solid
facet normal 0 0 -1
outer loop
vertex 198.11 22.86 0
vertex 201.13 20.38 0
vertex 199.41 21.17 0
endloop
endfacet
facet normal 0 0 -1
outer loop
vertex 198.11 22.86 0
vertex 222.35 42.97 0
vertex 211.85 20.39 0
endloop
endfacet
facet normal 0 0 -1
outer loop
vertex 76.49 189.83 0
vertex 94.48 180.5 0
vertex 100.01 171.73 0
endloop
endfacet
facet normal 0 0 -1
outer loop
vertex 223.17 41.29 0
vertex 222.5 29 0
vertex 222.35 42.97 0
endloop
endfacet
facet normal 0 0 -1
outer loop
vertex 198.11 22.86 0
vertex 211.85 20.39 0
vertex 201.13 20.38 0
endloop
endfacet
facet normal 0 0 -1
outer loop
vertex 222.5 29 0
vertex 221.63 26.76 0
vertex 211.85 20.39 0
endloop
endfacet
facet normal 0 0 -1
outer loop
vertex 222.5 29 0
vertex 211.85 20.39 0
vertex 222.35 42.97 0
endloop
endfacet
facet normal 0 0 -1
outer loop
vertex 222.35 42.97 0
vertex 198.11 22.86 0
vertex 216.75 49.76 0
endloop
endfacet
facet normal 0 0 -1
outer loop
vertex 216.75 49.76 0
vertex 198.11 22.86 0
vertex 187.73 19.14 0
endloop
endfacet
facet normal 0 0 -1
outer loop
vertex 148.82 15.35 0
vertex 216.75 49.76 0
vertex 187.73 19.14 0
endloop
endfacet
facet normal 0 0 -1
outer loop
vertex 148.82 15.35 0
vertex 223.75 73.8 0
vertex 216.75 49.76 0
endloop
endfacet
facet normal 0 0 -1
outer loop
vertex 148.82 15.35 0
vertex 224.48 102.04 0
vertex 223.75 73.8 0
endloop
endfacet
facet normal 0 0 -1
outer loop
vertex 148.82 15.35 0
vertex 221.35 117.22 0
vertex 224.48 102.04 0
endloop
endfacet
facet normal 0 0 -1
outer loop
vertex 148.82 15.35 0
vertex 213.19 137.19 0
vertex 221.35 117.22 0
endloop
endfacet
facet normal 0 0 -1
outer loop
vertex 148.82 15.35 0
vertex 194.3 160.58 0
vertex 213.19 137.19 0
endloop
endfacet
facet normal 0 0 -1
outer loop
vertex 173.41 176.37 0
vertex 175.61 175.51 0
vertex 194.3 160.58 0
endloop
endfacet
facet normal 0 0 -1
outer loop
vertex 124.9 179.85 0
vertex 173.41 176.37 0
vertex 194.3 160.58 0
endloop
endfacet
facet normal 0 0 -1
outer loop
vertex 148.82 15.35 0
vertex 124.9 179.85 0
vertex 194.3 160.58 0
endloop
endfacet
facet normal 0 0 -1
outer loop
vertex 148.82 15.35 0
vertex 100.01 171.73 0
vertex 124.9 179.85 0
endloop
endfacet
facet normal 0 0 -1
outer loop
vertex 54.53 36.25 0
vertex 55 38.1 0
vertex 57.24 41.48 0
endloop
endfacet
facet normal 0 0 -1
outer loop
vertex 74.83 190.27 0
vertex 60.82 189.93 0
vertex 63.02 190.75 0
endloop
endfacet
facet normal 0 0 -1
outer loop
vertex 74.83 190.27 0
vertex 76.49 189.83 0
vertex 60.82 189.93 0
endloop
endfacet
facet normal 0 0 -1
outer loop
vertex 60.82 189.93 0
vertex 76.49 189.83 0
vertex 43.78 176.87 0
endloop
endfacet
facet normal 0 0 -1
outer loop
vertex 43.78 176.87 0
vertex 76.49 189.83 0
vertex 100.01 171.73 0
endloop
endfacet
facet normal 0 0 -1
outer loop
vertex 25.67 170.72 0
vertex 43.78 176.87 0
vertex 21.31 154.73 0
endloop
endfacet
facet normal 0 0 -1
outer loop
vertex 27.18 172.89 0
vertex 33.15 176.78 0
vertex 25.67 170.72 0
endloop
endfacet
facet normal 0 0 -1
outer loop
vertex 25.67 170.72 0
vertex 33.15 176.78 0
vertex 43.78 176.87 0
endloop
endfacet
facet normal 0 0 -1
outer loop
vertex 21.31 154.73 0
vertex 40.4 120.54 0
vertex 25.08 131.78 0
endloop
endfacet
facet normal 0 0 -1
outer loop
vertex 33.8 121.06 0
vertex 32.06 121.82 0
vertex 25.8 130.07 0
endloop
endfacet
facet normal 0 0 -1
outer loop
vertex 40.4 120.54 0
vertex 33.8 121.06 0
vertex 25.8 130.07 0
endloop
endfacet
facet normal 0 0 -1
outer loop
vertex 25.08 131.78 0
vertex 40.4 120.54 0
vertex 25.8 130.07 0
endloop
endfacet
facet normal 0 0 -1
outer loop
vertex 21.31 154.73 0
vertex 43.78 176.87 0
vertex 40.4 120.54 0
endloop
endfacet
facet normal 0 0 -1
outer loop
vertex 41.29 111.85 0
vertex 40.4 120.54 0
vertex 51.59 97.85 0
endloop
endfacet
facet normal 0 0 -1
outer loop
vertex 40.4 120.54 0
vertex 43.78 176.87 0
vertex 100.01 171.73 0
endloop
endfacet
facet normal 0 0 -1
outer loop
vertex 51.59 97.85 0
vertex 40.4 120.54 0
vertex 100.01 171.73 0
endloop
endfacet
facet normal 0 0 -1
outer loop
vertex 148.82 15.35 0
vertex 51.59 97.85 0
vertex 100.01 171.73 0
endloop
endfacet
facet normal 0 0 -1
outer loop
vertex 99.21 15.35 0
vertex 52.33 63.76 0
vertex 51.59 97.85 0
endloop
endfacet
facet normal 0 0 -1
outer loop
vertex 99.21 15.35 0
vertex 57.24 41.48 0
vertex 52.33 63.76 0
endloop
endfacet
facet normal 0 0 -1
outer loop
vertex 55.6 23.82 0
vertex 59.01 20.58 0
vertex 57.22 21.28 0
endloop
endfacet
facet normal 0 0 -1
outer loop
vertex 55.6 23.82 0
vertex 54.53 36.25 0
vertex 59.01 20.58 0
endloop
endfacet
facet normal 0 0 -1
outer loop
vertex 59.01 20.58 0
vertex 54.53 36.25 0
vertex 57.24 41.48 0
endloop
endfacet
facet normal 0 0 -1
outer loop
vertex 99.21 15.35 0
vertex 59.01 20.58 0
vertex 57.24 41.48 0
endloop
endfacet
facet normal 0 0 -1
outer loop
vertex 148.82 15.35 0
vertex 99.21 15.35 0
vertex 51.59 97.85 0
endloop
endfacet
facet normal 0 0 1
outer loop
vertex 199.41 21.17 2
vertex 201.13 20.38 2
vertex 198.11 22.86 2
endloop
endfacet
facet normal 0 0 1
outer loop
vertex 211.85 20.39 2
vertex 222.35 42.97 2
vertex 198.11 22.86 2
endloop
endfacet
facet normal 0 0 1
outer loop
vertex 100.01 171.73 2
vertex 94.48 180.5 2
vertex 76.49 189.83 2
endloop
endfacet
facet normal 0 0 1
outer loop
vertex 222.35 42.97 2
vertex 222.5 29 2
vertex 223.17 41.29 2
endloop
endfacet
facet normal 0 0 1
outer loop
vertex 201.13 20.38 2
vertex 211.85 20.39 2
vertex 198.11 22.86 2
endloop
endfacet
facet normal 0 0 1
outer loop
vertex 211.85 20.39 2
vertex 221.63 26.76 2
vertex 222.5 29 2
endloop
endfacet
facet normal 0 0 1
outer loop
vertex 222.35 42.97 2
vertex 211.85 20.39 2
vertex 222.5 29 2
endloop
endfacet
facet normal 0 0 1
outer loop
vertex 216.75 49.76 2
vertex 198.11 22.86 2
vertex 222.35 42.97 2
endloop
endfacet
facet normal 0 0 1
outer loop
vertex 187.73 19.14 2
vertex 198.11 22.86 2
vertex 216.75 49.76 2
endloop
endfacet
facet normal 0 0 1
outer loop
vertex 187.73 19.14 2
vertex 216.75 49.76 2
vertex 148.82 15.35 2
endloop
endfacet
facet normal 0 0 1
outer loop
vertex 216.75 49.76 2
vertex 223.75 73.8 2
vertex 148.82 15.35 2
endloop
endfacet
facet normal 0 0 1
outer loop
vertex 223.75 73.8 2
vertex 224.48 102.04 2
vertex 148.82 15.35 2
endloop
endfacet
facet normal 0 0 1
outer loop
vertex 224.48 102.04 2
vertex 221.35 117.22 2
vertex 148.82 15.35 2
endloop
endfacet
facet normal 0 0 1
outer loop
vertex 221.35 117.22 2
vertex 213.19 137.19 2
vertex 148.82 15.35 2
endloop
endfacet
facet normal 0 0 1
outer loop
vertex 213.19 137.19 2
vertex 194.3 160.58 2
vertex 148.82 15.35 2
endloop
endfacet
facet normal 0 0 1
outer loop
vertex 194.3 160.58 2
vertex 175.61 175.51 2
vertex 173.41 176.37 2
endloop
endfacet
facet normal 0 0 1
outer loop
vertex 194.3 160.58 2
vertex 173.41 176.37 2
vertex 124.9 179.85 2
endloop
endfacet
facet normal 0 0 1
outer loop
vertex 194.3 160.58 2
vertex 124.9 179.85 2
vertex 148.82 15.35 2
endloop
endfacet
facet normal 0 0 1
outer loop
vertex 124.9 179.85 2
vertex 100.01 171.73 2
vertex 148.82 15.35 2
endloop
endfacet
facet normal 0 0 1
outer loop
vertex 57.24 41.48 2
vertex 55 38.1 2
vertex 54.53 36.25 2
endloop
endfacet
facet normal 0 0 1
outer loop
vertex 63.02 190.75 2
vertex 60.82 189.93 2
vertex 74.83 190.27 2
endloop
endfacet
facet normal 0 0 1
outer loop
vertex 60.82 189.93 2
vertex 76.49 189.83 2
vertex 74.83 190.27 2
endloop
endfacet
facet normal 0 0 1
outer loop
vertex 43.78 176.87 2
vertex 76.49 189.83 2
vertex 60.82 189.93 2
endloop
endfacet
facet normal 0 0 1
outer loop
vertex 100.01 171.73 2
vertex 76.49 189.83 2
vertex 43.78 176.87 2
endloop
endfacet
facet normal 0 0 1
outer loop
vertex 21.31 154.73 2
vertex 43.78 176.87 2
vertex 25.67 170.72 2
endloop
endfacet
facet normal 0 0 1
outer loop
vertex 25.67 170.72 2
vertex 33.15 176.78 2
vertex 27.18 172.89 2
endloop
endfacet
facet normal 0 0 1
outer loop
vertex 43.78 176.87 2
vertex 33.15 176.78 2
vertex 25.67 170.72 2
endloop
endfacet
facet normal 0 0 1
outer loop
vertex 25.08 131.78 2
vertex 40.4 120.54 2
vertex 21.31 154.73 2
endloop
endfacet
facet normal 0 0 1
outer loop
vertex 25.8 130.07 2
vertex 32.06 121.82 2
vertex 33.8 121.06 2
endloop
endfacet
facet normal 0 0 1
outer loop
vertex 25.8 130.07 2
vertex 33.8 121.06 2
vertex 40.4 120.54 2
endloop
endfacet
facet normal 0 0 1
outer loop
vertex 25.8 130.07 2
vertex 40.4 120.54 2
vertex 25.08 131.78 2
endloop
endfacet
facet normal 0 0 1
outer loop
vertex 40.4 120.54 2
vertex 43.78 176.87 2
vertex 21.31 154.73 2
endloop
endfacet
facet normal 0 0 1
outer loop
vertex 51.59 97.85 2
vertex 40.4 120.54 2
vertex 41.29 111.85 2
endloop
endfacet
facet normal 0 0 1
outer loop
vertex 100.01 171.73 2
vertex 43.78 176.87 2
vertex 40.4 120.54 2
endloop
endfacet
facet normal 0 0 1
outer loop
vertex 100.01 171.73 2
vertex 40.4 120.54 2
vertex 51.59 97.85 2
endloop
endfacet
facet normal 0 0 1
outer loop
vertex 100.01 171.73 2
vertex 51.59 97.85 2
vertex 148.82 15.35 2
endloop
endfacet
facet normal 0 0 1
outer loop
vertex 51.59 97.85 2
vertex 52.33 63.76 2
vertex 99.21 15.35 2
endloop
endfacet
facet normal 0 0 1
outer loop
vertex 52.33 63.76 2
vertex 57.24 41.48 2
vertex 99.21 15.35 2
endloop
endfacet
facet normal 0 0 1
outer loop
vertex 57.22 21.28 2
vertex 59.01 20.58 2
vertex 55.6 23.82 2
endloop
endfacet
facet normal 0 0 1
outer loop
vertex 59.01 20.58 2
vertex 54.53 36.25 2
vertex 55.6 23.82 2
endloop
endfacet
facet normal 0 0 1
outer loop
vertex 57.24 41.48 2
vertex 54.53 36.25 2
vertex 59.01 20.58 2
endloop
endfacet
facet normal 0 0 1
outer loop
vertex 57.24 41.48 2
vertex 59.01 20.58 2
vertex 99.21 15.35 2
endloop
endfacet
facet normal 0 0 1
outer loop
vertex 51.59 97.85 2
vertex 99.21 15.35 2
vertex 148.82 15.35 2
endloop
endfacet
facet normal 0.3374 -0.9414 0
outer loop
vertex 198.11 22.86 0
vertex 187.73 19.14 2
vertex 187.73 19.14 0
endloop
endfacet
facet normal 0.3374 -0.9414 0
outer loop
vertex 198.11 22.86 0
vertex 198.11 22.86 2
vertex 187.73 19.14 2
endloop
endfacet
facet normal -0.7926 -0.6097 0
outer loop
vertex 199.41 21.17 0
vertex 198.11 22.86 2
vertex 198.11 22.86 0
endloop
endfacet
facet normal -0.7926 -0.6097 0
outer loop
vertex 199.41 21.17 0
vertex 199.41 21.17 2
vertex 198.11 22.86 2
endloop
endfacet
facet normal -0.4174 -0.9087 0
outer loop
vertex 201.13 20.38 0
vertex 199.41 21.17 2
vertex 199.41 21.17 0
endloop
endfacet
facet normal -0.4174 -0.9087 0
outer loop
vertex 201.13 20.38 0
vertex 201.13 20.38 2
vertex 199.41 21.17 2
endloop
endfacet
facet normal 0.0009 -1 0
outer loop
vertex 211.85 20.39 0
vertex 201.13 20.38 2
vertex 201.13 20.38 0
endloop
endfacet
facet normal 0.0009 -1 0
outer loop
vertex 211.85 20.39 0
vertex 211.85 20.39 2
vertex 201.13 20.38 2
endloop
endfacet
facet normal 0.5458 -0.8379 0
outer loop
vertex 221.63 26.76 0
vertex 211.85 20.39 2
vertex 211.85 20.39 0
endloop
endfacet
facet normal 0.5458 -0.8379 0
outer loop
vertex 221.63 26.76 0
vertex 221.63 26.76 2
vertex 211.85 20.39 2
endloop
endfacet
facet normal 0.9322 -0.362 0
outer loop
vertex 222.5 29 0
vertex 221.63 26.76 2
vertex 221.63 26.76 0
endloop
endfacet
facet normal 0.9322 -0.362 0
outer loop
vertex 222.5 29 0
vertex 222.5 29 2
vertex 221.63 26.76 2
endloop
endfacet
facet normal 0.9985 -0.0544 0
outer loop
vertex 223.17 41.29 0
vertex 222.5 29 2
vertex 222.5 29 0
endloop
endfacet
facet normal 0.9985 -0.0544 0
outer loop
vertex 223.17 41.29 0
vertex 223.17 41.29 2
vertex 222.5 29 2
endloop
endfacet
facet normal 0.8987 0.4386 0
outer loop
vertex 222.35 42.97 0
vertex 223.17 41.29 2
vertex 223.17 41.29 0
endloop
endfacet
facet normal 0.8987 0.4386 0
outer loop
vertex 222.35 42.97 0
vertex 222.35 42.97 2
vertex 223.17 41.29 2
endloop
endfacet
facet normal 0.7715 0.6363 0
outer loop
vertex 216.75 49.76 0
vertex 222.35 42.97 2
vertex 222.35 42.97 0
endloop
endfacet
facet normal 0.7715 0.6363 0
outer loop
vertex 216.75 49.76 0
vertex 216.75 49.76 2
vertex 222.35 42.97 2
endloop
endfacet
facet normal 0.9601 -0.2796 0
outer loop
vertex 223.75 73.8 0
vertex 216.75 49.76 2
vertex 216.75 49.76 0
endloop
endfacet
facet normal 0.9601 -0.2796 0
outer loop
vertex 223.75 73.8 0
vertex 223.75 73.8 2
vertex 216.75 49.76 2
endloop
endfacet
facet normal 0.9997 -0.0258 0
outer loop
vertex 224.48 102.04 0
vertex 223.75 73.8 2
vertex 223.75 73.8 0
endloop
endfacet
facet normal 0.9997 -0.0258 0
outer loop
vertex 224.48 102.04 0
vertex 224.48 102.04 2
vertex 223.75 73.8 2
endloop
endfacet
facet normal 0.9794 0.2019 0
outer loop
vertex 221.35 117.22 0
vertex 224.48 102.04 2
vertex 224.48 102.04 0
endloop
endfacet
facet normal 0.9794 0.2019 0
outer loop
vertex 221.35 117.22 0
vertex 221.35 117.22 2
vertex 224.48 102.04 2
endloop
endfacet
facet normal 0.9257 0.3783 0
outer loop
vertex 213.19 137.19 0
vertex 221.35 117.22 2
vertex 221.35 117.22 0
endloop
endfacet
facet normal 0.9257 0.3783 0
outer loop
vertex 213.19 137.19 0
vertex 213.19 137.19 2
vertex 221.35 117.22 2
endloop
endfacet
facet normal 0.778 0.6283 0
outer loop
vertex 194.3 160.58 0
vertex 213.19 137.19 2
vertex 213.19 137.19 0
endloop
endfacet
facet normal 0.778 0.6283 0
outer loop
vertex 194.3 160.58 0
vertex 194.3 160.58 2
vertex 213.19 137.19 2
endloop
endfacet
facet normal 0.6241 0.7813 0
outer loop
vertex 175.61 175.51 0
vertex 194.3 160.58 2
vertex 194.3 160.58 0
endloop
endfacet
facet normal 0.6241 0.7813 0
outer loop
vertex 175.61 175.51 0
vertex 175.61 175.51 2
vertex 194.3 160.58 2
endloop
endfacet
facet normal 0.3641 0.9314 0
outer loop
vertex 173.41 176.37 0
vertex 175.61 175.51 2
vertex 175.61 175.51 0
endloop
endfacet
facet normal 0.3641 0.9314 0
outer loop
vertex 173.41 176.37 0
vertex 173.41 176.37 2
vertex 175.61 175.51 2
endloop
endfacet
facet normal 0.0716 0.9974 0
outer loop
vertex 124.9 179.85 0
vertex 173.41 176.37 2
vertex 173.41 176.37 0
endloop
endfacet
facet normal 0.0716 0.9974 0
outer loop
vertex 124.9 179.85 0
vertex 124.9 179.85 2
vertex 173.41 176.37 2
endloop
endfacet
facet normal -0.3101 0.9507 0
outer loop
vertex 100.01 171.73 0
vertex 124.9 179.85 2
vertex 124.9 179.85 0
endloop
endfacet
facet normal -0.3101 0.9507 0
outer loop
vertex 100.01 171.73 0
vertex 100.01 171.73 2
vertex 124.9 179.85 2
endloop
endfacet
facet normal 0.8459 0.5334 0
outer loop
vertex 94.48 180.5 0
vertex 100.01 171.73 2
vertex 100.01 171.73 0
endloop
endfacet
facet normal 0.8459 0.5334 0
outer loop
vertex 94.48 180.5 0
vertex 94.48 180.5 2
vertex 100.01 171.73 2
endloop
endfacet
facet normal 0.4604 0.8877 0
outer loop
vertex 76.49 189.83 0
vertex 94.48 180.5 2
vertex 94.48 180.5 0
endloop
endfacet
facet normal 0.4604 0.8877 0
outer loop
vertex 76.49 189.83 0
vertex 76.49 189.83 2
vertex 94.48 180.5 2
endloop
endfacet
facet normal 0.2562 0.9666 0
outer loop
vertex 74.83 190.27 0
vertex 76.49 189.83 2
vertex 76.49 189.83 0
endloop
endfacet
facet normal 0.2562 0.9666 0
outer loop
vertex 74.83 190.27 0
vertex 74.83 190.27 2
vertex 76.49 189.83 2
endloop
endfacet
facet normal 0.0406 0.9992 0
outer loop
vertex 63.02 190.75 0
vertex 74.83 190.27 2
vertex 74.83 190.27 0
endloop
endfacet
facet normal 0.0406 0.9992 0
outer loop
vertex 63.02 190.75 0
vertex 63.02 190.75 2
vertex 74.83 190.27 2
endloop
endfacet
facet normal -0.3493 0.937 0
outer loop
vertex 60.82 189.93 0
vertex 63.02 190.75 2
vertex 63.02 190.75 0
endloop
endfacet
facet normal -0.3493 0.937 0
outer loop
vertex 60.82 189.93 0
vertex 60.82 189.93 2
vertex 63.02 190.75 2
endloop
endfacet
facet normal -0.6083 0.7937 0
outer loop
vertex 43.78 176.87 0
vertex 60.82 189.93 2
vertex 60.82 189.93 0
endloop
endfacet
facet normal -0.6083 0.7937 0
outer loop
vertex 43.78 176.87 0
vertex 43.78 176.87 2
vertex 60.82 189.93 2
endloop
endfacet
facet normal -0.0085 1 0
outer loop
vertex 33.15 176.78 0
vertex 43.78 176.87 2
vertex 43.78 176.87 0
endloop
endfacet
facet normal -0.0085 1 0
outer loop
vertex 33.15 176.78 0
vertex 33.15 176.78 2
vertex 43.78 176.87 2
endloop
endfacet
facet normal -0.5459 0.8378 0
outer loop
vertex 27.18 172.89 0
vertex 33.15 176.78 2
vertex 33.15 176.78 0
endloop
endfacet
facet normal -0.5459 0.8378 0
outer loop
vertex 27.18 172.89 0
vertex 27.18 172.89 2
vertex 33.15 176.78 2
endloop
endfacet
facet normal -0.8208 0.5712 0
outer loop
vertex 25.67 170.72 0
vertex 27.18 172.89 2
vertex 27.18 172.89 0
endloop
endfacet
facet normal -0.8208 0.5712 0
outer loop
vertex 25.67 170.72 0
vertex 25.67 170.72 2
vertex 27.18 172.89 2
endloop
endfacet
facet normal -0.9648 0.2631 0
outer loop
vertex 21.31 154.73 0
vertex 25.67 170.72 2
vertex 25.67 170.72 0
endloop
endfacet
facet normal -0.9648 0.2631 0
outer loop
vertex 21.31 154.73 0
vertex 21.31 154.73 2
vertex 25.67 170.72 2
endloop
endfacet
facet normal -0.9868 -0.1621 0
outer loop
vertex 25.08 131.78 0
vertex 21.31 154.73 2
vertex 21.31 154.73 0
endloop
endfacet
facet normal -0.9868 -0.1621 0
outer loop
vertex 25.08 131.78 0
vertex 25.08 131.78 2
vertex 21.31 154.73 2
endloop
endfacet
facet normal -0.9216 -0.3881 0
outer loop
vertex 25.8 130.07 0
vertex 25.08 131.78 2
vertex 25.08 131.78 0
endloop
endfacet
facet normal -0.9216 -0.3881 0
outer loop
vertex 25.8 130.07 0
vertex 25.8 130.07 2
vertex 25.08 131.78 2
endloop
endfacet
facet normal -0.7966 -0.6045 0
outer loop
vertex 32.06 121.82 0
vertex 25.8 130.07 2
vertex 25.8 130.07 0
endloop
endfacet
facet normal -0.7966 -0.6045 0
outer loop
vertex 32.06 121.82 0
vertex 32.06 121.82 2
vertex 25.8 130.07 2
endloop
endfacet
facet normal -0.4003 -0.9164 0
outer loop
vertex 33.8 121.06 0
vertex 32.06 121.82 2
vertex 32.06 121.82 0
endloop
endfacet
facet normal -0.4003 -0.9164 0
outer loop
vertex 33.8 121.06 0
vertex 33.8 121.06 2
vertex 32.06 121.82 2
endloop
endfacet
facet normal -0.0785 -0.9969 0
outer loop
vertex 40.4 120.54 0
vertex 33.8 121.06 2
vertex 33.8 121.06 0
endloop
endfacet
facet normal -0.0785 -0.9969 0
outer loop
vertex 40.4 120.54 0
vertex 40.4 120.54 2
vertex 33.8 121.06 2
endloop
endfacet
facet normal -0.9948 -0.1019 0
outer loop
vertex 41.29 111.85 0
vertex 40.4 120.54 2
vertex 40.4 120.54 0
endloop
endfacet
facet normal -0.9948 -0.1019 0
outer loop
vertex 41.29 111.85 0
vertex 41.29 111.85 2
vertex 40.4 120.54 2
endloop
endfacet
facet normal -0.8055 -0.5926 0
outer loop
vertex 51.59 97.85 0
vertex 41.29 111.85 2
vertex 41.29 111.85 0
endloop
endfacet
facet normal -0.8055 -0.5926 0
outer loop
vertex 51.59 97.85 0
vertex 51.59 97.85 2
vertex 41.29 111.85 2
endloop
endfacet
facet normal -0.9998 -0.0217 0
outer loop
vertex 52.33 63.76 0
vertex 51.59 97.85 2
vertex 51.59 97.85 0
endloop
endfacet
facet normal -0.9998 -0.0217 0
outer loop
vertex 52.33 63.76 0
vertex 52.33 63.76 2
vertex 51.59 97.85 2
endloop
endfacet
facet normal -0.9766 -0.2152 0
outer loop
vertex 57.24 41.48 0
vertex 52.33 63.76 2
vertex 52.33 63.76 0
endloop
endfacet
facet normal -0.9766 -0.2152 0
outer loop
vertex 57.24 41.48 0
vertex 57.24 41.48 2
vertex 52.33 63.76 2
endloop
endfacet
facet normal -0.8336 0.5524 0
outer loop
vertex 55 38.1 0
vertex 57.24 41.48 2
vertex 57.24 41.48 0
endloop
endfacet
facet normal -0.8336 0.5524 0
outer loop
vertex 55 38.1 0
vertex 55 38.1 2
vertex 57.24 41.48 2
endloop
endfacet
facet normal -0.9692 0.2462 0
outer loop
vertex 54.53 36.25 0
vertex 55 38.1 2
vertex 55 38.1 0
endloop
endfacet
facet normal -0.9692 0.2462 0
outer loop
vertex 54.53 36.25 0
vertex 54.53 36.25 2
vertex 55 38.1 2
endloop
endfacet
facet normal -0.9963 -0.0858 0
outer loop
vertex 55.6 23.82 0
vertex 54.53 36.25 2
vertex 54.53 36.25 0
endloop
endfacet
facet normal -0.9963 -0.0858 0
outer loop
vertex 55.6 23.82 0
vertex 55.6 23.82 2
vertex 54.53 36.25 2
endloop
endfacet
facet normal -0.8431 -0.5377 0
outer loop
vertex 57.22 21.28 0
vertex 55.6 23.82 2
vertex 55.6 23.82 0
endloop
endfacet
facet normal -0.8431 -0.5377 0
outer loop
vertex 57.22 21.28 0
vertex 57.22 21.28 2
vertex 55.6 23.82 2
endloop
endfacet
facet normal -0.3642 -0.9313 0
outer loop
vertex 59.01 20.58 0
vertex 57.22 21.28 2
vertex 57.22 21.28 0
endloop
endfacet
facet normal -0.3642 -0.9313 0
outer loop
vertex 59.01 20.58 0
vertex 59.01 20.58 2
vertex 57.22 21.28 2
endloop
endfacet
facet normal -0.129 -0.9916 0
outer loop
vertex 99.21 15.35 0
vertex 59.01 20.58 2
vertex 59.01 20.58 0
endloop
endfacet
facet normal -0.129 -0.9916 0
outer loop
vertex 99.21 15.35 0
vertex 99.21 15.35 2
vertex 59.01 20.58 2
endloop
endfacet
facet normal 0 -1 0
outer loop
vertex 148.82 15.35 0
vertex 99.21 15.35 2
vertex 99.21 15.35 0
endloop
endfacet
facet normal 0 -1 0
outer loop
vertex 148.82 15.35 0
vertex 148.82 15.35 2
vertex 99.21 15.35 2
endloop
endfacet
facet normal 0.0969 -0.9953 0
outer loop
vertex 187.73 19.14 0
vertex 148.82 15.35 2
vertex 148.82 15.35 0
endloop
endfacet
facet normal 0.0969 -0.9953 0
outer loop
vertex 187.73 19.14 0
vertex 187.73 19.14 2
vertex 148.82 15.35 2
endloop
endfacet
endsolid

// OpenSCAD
// ============================================================================
// 🏰 Main Street Electrical Parade (WDW 10K) - 3D TPU Armor Plate (FRONT)
// Dimensions: 203.18mm x 175.4mm x 10.0mm
// Sized for Snapmaker U1 & Bambu Lab | Material: 95A TPU
// Aperture: Ø 3.4mm round optical apertures (Default) | Orientation: horizontal
// ============================================================================
$fn = 24;
front_thickness = 2.0;
total_thickness = 10.0;
contour_pts = [[27.18, 172.89], [33.15, 176.78], [43.78, 176.87], [60.82, 189.93], [63.02, 190.75], [74.83, 190.27], [76.49, 189.83], [94.48, 180.5], [100.01, 171.73], [124.9, 179.85], [173.41, 176.37], [175.61, 175.51], [194.3, 160.58], [213.19, 137.19], [221.35, 117.22], [224.48, 102.04], [223.75, 73.8], [216.75, 49.76], [222.35, 42.97], [223.17, 41.29], [222.5, 29.0], [221.63, 26.76], [211.85, 20.39], [201.13, 20.38], [199.41, 21.17], [198.11, 22.86], [187.73, 19.14], [148.82, 15.35], [99.21, 15.35], [59.01, 20.58], [57.22, 21.28], [55.6, 23.82], [54.53, 36.25], [55.0, 38.1], [57.24, 41.48], [52.33, 63.76], [51.59, 97.85], [41.29, 111.85], [40.4, 120.54], [33.8, 121.06], [32.06, 121.82], [25.8, 130.07], [25.08, 131.78], [21.31, 154.73], [25.67, 170.72], [27.18, 172.89]];
ordered_leds = [[117.14, 39.33], [101.61, 27.57], [77.48, 30.58], [84.81, 45.08], [69.82, 57.26], [74.09, 72.1], [66.81, 87.97], [64.95, 103.09], [55.32, 117.32], [45.92, 131.0], [41.87, 150.15], [45.59, 165.34], [63.42, 172.25], [66.7, 156.79], [58.01, 142.56], [75.4, 121.28], [85.14, 107.26], [87.88, 88.72], [105.33, 103.57], [111.95, 89.07], [100.13, 76.27], [90.06, 62.52], [103.74, 50.89], [113.42, 64.78], [125.46, 77.5], [128.74, 55.82], [137.93, 41.8], [142.47, 27.16], [163.26, 28.87], [184.1, 30.71], [181.7, 45.22], [202.05, 48.71], [197.73, 63.28], [194.11, 83.87], [179.29, 93.65], [181.7, 71.35], [170.37, 58.35], [158.94, 43.44], [149.47, 57.94], [166.82, 81.13], [146.41, 77.98], [140.94, 92.49], [126.39, 102.68], [116.65, 116.7], [96.41, 120.46], [97.83, 135.1], [76.0, 135.92], [87.11, 149.13], [90.06, 163.63], [111.13, 163.29], [108.06, 148.72], [119.6, 135.79], [129.01, 150.84], [131.2, 167.66], [152.05, 166.16], [150.19, 151.66], [140.45, 137.84], [134.76, 123.34], [146.41, 110.34], [159.54, 98.44], [166.16, 115.2], [160.03, 132.5], [169.77, 146.6], [172.07, 161.64], [190.07, 143.24], [180.44, 129.22], [185.2, 109.72], [203.2, 122.99], [206.31, 108.36], [208.78, 93.85]];
fastener_tabs = [[26.36, 174.15], [63.08, 192.23], [100.14, 174.33], [138.48, 180.38], [179.92, 173.99], [209.42, 144.25], [225.32, 105.4], [219.48, 53.76], [220.92, 24.51], [181.72, 17.04], [139.92, 13.85], [97.92, 14.0], [55.87, 20.66], [51.29, 61.48], [47.0, 101.56], [23.5, 132.14]];

linear_extrude(front_thickness) polygon(contour_pts);
